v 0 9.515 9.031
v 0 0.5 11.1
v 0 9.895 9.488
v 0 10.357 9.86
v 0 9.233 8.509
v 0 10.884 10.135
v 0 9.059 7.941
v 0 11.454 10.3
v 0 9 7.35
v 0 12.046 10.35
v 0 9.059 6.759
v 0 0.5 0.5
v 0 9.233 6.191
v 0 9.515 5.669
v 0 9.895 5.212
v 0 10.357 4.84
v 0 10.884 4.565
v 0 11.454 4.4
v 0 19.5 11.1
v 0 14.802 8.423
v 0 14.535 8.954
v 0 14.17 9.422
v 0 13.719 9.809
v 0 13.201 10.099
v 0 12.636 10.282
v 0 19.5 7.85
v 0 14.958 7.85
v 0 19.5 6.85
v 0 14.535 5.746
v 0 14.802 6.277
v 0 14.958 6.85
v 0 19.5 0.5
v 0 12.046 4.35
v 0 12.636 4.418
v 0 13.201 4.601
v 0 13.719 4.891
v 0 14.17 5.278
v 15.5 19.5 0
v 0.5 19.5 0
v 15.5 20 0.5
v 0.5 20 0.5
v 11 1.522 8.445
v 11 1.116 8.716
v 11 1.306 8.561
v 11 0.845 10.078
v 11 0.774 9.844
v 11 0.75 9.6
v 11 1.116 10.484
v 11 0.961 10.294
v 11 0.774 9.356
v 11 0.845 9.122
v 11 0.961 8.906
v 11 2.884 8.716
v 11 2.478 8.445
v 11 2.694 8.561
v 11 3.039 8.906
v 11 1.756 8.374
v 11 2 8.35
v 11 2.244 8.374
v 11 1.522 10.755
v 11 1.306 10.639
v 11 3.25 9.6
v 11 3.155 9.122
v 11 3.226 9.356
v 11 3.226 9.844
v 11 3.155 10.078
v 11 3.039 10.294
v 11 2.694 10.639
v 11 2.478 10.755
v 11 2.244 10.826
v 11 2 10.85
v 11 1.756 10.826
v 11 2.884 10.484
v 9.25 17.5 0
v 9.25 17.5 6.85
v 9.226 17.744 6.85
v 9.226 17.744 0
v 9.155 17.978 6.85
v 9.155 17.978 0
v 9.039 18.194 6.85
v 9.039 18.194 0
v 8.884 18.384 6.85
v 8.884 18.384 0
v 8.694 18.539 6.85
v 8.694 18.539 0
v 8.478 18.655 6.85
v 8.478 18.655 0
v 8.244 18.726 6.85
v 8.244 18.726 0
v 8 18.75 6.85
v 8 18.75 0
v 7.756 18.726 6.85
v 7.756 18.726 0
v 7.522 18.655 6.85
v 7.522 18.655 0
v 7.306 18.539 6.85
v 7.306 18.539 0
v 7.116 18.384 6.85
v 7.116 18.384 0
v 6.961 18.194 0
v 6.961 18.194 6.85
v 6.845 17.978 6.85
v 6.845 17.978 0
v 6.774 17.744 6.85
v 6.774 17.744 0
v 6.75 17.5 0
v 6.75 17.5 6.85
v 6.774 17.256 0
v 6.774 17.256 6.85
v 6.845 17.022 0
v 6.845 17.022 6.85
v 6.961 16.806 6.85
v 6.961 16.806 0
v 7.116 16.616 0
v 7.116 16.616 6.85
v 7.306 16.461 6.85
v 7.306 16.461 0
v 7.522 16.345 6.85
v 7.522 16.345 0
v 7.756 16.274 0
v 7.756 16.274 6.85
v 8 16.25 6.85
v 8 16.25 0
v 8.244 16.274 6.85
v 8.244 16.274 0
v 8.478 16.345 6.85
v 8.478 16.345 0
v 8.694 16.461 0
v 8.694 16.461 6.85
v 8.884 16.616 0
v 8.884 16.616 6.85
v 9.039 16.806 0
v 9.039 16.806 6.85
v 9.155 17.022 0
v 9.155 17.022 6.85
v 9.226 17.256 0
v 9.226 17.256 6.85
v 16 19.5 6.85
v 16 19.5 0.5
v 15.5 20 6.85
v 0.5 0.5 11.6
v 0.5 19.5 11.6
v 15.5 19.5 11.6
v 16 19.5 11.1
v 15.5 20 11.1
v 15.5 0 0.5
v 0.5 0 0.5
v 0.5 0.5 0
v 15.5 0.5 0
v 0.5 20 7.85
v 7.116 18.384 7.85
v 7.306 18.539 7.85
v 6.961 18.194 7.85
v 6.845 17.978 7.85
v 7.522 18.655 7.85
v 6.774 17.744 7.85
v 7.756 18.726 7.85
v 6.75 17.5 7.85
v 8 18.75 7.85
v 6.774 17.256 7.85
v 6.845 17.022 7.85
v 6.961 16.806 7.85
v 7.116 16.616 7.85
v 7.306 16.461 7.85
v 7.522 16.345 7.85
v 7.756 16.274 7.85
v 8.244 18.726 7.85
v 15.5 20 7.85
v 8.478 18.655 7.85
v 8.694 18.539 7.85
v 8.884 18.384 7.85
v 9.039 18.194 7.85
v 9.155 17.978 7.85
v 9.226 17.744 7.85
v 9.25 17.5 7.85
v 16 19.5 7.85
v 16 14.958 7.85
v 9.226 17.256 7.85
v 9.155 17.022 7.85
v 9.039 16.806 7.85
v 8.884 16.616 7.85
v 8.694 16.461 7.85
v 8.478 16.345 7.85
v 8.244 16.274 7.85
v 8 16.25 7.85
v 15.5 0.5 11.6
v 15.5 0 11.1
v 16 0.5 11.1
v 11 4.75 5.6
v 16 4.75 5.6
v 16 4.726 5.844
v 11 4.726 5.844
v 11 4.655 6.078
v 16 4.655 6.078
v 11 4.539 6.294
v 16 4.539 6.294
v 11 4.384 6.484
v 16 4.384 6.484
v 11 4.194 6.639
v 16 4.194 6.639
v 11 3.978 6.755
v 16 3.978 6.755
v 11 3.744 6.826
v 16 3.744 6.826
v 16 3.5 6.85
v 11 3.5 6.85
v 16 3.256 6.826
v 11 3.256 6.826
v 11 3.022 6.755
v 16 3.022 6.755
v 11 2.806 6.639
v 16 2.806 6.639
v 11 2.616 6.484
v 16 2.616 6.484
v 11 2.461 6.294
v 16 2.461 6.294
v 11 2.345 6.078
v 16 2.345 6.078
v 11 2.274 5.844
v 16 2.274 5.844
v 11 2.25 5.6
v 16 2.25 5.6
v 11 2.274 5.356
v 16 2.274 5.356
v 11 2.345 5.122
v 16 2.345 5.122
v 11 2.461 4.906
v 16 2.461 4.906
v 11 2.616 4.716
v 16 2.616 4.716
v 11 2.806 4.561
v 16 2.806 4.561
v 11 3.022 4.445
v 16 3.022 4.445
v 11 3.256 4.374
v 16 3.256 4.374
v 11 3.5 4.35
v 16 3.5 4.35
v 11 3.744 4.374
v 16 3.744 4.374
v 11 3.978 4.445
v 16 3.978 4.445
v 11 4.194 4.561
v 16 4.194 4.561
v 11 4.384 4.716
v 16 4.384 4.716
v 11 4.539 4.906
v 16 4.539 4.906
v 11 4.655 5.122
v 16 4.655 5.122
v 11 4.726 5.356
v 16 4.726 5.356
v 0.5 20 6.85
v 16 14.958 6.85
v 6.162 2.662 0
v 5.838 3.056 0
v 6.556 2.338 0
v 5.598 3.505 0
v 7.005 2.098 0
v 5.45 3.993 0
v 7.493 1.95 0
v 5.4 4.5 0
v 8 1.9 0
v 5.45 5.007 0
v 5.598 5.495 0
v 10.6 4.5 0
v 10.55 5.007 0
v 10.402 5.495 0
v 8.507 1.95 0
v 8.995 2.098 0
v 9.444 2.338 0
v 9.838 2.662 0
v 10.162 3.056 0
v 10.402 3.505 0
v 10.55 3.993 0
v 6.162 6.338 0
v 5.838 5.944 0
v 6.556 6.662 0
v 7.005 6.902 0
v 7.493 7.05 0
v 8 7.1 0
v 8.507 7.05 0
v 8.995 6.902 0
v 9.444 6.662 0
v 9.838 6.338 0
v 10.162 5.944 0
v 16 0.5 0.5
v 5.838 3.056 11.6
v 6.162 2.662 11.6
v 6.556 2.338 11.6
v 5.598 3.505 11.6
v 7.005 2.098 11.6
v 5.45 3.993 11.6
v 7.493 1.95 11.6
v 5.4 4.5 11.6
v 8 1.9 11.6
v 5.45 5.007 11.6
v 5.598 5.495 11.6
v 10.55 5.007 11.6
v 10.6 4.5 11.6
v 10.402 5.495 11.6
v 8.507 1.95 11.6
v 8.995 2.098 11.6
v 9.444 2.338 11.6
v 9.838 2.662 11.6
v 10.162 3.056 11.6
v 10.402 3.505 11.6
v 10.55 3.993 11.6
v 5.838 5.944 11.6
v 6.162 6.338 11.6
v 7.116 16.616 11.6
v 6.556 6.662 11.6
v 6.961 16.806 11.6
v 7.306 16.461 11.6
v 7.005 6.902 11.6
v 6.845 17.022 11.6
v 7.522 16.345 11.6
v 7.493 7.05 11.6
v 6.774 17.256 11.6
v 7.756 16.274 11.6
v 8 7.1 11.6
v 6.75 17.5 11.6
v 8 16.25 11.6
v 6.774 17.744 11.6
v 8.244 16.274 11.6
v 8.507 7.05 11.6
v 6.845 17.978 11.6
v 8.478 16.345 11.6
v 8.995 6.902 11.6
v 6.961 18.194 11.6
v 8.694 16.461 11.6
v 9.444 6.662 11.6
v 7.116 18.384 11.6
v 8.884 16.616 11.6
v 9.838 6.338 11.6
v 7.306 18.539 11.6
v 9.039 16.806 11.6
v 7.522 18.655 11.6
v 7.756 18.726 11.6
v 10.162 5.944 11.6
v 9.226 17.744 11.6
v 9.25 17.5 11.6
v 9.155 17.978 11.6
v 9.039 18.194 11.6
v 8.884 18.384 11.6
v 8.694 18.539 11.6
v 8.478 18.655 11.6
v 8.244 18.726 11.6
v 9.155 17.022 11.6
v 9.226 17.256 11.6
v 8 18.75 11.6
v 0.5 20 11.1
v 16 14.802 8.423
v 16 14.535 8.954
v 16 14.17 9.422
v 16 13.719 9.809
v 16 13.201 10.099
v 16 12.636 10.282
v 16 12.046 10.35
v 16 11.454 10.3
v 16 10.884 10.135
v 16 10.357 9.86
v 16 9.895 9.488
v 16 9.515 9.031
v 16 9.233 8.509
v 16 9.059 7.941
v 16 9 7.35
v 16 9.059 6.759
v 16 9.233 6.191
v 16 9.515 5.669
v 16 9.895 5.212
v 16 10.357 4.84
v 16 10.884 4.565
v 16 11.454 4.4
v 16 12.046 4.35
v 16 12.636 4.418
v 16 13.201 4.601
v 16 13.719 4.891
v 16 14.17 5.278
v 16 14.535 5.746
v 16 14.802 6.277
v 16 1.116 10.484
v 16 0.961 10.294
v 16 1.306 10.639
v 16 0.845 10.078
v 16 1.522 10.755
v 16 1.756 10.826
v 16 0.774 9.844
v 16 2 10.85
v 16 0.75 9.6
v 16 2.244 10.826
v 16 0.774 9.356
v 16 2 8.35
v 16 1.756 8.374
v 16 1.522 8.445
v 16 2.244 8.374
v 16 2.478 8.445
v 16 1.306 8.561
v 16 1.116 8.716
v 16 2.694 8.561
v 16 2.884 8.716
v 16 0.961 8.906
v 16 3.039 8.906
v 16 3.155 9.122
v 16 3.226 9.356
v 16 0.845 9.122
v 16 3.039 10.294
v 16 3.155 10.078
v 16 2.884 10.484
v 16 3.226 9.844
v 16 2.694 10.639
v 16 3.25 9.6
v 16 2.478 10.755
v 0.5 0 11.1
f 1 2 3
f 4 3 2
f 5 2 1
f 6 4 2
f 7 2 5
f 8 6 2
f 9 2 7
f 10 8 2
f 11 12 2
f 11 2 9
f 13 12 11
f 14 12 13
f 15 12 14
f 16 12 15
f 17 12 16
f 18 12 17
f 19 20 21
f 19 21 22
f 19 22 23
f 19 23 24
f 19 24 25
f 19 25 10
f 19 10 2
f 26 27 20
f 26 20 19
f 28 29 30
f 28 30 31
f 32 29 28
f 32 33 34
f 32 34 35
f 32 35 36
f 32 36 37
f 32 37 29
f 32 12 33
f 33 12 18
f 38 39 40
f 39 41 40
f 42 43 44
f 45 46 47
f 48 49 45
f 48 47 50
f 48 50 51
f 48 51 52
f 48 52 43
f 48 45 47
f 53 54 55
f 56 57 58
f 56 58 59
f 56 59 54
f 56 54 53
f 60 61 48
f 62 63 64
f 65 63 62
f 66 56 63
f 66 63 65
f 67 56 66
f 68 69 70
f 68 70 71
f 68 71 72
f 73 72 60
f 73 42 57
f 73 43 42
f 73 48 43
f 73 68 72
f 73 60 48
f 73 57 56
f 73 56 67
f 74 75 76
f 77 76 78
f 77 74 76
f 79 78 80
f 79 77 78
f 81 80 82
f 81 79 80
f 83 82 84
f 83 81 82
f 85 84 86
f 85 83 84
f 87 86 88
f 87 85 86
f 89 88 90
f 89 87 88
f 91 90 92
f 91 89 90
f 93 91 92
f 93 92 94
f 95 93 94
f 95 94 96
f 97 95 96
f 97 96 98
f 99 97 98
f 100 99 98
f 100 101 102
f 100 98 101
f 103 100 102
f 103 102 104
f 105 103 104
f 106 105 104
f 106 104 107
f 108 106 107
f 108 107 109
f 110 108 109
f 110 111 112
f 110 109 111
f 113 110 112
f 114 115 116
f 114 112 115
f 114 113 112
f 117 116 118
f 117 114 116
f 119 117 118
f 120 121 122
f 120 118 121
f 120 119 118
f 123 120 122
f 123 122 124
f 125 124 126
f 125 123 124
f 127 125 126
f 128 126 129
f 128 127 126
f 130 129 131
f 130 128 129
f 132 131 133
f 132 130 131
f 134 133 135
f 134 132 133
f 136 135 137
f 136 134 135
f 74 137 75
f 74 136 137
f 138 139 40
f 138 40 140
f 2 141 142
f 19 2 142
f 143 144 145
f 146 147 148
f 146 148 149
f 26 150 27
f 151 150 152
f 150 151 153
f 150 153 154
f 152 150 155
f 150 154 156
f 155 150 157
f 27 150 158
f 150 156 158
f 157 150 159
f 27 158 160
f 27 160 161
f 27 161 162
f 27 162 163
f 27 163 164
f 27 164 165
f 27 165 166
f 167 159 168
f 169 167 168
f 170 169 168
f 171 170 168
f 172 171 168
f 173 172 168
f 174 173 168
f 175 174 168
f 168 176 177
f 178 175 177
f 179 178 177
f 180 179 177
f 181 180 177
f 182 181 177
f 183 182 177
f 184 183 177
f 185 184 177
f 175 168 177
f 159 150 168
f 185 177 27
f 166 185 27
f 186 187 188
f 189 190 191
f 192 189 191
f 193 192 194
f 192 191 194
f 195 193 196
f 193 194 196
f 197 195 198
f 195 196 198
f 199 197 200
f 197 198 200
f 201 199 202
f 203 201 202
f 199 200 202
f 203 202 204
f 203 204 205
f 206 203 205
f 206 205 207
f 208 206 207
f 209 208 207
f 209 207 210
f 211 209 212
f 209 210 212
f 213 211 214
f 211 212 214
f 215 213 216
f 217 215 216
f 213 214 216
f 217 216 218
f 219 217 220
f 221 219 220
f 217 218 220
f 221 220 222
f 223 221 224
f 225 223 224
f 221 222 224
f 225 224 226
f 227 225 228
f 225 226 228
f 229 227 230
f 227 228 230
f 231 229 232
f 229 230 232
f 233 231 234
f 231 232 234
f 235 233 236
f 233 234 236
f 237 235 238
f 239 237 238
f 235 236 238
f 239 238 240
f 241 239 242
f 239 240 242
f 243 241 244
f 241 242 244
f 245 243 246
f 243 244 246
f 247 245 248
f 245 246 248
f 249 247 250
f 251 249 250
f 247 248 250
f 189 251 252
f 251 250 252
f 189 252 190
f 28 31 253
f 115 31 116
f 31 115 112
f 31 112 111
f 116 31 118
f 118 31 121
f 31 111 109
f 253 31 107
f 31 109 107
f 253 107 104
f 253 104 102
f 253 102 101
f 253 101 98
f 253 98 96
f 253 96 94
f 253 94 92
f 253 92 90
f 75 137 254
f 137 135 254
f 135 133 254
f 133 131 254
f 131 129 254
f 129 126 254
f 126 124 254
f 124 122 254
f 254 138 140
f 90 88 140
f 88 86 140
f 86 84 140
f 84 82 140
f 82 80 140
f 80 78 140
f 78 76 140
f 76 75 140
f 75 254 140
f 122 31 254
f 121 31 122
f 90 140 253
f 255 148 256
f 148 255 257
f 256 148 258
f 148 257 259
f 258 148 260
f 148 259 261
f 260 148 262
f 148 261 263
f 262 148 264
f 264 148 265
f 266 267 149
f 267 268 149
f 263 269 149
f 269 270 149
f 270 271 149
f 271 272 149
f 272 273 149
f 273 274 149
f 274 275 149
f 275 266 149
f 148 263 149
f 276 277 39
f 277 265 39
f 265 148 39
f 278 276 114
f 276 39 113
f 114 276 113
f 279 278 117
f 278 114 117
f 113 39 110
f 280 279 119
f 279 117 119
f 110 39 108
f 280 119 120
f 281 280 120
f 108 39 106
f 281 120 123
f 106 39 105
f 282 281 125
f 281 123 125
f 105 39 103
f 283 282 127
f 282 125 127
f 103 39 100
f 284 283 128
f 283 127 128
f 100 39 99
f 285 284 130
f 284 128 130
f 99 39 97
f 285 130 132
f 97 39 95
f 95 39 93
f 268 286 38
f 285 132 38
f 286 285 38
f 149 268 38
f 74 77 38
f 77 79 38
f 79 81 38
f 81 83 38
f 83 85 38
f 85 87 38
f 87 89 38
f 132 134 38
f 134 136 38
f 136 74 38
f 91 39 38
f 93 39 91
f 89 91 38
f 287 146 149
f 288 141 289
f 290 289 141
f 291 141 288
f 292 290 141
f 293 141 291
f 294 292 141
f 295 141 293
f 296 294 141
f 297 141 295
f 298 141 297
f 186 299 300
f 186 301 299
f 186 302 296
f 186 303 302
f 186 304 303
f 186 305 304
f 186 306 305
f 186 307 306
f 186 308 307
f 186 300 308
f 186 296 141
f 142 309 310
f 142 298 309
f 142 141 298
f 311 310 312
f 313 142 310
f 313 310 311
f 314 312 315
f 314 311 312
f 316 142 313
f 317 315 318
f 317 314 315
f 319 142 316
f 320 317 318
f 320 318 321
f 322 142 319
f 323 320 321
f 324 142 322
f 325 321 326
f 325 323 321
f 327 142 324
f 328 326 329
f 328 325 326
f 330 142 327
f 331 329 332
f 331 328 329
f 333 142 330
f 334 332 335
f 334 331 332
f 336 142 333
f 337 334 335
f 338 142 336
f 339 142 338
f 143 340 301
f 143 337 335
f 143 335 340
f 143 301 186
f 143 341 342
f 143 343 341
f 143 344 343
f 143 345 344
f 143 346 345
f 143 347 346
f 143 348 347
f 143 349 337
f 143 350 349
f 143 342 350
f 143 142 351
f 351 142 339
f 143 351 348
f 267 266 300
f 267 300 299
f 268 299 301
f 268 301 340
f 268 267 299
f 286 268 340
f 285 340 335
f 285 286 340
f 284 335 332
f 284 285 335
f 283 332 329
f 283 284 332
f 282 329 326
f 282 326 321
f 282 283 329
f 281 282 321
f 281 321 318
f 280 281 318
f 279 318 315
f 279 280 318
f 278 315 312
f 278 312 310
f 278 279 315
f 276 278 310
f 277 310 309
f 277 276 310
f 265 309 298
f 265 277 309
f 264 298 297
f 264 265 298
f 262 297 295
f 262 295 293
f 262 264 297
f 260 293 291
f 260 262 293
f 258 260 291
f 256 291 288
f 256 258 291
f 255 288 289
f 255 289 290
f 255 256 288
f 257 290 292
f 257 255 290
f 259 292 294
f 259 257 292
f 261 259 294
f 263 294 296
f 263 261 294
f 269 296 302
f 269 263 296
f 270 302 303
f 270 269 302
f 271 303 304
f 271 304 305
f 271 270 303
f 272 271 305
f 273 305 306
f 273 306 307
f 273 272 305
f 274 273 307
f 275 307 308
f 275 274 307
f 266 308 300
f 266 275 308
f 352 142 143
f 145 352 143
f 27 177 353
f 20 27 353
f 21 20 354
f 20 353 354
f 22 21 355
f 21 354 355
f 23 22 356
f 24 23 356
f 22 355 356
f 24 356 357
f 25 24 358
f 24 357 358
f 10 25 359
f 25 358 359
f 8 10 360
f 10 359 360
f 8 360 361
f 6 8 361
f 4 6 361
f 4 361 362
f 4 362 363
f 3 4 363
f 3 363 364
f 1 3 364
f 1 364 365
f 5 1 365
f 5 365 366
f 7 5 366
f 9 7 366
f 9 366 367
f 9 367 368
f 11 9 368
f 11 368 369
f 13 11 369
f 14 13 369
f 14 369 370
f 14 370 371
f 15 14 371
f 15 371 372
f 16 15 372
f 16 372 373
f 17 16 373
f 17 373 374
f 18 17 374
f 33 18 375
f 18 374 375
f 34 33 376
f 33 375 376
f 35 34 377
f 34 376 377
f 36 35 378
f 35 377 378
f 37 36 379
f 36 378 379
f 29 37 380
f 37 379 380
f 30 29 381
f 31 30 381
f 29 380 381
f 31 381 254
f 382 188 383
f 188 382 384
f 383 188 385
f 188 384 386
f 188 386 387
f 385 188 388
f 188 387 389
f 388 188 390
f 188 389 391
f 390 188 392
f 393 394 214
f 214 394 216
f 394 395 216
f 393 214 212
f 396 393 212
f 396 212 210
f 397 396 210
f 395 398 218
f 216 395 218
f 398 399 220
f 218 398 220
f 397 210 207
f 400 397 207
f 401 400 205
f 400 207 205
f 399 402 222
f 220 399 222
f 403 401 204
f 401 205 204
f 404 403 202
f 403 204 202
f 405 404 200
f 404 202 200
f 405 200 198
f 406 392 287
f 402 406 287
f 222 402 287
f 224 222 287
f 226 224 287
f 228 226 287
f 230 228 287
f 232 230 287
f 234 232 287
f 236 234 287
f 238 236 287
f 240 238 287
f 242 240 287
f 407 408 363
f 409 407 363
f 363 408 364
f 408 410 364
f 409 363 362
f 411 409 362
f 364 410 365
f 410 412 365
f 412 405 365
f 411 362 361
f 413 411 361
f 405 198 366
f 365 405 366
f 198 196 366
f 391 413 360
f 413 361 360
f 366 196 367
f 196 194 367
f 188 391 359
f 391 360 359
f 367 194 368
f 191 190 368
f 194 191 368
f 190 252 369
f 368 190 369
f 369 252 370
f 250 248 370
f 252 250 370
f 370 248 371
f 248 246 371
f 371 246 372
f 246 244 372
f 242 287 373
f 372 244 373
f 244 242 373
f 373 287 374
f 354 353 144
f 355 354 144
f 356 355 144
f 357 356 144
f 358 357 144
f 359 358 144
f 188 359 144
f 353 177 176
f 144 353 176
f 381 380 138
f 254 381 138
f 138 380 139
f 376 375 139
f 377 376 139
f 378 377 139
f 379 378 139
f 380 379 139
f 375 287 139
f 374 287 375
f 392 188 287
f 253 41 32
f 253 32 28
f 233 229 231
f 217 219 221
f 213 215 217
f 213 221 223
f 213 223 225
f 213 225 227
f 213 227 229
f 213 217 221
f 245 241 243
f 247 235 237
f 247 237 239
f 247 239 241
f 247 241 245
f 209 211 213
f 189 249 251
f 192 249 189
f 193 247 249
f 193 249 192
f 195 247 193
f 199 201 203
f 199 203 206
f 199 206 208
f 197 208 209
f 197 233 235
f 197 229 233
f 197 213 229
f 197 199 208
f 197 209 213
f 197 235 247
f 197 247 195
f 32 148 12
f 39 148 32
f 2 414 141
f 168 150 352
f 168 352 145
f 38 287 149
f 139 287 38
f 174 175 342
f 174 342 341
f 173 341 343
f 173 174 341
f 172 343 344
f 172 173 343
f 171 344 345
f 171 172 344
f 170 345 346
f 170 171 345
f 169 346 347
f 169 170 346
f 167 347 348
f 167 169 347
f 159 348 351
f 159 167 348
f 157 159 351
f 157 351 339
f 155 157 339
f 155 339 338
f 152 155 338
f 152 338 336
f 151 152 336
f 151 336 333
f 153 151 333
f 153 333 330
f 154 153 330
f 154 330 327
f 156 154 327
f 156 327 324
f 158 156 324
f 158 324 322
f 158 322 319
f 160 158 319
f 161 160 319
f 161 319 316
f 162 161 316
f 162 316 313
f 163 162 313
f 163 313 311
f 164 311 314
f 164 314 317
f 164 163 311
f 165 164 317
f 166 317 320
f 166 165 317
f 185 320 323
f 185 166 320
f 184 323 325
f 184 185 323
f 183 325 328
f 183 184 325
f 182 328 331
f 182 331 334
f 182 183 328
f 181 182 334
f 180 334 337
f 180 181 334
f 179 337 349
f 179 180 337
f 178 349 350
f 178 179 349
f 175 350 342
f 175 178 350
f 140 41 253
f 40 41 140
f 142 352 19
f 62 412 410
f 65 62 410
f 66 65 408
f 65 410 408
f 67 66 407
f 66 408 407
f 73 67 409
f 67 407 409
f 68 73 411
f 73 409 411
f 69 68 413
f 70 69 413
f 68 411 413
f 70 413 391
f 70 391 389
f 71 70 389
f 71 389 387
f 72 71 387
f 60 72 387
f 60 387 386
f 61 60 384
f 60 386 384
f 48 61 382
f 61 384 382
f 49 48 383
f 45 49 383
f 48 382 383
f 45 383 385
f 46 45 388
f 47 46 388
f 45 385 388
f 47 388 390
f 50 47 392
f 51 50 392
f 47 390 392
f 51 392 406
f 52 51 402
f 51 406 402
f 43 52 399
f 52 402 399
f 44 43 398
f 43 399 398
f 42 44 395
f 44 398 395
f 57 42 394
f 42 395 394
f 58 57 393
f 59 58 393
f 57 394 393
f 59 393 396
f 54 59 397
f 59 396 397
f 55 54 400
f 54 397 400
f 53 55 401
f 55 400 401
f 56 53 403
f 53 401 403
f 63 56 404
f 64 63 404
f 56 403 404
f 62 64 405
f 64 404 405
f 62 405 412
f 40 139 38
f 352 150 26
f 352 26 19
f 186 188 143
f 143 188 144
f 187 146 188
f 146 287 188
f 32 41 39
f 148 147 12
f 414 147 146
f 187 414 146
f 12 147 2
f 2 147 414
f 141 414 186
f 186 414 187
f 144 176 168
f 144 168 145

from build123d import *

# Parameters (mm, degrees)
F0_W     = 16
F0_H     = 20
F0_R     = 2.6
F0_R_2   = 1.25
F1_DEPTH = 11.6
F3_DEPTH = 16.001
F4_R     = 1.25
F5_DEPTH = 5
F6_SIZE  = 0.5


with BuildPart() as f1:
    # F0 (on Top) → F1 (new body)
    with BuildSketch(Plane.XY):
        with Locations((8, 10)):
            Rectangle(F0_W, F0_H)
        with Locations((8, 4.5)):
            Circle(F0_R, mode=Mode.SUBTRACT)
        with Locations((8, 17.5)):
            Circle(F0_R_2, mode=Mode.SUBTRACT)
    extrude(amount=F1_DEPTH)

    # F2 (on face) → F3 (cut, through all)
    with BuildSketch(Plane.YZ.offset(16)):
        with BuildLine():
            Line((21.9580398915, 7.85), (14.9580398915, 7.85))
            ThreePointArc((14.9580398915, 7.85), (9, 7.35), (14.9580398915, 6.85))
            Line((14.9580398915, 6.85), (21.9580398915, 6.85))
            Line((21.9580398915, 6.85), (21.9580398915, 7.85))
        make_face()
    extrude(amount=-F3_DEPTH, mode=Mode.SUBTRACT)

    # F4 (on face) → F5 (cut)
    with BuildSketch(Plane.YZ.offset(16)):
        with Locations((2, 9.6)):
            Circle(F4_R)
        with Locations((3.5, 5.6)):
            Circle(F4_R)
    extrude(amount=-F5_DEPTH, mode=Mode.SUBTRACT)

    # F6
    f6_edges = [f1.edges().sort_by_distance(p)[0] for p in [
        (0, 0, 5.8),
        (16, 0, 5.8),
        (8, 0, 0),
        (8, 0, 11.6),
        (16, 10, 11.6),
        (16, 10, 0),
        (16, 20, 3.425),
        (16, 20, 9.725),
        (0, 20, 9.725),
        (8, 20, 11.6),
        (8, 20, 0),
        (0, 20, 3.425),
        (0, 10, 11.6),
        (0, 10, 0),
    ]]
    chamfer(f6_edges, length=F6_SIZE)


solid = f1.part
